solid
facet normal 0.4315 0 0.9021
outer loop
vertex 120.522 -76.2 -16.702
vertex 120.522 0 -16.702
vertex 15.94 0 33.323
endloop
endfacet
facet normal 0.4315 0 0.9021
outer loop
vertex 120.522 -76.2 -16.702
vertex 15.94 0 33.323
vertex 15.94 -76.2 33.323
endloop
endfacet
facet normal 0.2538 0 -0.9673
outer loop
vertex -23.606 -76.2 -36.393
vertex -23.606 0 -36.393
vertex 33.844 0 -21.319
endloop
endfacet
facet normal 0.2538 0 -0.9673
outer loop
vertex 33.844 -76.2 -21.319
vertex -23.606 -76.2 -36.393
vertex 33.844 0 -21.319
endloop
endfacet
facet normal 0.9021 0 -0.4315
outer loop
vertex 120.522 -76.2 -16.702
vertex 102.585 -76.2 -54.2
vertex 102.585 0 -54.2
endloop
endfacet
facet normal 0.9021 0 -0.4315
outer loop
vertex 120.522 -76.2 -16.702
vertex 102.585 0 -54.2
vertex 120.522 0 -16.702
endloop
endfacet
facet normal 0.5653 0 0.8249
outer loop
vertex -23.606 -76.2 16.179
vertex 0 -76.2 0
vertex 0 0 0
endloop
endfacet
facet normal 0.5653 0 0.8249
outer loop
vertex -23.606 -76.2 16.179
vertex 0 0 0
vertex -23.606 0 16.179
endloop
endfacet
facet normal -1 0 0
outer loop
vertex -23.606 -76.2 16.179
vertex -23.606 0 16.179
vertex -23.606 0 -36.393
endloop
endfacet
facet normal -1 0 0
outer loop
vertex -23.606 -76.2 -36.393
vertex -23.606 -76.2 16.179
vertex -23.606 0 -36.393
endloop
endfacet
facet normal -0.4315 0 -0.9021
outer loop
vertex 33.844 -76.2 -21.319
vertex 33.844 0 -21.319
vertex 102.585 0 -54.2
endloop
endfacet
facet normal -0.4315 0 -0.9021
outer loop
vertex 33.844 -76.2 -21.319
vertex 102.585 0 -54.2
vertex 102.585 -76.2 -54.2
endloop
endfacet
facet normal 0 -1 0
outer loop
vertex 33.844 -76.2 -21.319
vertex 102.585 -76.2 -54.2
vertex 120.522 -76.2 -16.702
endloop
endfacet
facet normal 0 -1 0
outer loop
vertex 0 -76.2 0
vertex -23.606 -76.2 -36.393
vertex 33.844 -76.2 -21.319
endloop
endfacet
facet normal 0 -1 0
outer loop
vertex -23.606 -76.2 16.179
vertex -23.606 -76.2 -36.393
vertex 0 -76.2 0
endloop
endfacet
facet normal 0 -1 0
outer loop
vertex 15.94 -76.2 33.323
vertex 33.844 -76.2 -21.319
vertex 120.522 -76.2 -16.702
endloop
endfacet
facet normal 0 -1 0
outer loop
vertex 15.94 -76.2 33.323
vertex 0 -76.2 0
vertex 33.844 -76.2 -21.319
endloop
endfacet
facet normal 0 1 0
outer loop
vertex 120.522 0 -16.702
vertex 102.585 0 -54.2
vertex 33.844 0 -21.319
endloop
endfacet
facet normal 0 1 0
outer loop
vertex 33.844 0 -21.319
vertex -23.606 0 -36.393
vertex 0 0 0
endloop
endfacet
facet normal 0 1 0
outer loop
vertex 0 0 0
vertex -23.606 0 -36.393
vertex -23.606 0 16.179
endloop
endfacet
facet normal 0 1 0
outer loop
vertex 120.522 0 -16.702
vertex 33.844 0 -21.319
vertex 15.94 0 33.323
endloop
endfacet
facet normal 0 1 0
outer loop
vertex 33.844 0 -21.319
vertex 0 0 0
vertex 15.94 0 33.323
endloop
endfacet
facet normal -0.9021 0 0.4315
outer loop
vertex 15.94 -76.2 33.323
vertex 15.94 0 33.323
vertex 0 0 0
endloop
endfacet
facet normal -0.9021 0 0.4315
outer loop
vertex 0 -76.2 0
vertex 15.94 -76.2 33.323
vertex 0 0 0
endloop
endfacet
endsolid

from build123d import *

# Parameters (mm, degrees)
F1_DEPTH = 76.2
F2_DEPTH = 76.2


with BuildPart() as f1:
    # F0 (on Front) → F1 (new body)
    with BuildSketch(Plane.XZ):
        Polygon((15.9395597875, 33.3230420947), (0, 0), (-23.6055366695, 16.1788745644), (-23.6055366695, -36.3934971392), (33.8444890328, -21.3188421257), (51.7809395939, 16.1788745644), align=None)
    extrude(amount=F1_DEPTH)

    # F2 (add): a face of the model
    f2_faces = [f1.faces().sort_by_distance(p)[0] for p in [
        (42.8127143134, -38.1, -2.5699837806),
    ]]
    extrude(f2_faces, amount=F2_DEPTH)


solid = f1.part
